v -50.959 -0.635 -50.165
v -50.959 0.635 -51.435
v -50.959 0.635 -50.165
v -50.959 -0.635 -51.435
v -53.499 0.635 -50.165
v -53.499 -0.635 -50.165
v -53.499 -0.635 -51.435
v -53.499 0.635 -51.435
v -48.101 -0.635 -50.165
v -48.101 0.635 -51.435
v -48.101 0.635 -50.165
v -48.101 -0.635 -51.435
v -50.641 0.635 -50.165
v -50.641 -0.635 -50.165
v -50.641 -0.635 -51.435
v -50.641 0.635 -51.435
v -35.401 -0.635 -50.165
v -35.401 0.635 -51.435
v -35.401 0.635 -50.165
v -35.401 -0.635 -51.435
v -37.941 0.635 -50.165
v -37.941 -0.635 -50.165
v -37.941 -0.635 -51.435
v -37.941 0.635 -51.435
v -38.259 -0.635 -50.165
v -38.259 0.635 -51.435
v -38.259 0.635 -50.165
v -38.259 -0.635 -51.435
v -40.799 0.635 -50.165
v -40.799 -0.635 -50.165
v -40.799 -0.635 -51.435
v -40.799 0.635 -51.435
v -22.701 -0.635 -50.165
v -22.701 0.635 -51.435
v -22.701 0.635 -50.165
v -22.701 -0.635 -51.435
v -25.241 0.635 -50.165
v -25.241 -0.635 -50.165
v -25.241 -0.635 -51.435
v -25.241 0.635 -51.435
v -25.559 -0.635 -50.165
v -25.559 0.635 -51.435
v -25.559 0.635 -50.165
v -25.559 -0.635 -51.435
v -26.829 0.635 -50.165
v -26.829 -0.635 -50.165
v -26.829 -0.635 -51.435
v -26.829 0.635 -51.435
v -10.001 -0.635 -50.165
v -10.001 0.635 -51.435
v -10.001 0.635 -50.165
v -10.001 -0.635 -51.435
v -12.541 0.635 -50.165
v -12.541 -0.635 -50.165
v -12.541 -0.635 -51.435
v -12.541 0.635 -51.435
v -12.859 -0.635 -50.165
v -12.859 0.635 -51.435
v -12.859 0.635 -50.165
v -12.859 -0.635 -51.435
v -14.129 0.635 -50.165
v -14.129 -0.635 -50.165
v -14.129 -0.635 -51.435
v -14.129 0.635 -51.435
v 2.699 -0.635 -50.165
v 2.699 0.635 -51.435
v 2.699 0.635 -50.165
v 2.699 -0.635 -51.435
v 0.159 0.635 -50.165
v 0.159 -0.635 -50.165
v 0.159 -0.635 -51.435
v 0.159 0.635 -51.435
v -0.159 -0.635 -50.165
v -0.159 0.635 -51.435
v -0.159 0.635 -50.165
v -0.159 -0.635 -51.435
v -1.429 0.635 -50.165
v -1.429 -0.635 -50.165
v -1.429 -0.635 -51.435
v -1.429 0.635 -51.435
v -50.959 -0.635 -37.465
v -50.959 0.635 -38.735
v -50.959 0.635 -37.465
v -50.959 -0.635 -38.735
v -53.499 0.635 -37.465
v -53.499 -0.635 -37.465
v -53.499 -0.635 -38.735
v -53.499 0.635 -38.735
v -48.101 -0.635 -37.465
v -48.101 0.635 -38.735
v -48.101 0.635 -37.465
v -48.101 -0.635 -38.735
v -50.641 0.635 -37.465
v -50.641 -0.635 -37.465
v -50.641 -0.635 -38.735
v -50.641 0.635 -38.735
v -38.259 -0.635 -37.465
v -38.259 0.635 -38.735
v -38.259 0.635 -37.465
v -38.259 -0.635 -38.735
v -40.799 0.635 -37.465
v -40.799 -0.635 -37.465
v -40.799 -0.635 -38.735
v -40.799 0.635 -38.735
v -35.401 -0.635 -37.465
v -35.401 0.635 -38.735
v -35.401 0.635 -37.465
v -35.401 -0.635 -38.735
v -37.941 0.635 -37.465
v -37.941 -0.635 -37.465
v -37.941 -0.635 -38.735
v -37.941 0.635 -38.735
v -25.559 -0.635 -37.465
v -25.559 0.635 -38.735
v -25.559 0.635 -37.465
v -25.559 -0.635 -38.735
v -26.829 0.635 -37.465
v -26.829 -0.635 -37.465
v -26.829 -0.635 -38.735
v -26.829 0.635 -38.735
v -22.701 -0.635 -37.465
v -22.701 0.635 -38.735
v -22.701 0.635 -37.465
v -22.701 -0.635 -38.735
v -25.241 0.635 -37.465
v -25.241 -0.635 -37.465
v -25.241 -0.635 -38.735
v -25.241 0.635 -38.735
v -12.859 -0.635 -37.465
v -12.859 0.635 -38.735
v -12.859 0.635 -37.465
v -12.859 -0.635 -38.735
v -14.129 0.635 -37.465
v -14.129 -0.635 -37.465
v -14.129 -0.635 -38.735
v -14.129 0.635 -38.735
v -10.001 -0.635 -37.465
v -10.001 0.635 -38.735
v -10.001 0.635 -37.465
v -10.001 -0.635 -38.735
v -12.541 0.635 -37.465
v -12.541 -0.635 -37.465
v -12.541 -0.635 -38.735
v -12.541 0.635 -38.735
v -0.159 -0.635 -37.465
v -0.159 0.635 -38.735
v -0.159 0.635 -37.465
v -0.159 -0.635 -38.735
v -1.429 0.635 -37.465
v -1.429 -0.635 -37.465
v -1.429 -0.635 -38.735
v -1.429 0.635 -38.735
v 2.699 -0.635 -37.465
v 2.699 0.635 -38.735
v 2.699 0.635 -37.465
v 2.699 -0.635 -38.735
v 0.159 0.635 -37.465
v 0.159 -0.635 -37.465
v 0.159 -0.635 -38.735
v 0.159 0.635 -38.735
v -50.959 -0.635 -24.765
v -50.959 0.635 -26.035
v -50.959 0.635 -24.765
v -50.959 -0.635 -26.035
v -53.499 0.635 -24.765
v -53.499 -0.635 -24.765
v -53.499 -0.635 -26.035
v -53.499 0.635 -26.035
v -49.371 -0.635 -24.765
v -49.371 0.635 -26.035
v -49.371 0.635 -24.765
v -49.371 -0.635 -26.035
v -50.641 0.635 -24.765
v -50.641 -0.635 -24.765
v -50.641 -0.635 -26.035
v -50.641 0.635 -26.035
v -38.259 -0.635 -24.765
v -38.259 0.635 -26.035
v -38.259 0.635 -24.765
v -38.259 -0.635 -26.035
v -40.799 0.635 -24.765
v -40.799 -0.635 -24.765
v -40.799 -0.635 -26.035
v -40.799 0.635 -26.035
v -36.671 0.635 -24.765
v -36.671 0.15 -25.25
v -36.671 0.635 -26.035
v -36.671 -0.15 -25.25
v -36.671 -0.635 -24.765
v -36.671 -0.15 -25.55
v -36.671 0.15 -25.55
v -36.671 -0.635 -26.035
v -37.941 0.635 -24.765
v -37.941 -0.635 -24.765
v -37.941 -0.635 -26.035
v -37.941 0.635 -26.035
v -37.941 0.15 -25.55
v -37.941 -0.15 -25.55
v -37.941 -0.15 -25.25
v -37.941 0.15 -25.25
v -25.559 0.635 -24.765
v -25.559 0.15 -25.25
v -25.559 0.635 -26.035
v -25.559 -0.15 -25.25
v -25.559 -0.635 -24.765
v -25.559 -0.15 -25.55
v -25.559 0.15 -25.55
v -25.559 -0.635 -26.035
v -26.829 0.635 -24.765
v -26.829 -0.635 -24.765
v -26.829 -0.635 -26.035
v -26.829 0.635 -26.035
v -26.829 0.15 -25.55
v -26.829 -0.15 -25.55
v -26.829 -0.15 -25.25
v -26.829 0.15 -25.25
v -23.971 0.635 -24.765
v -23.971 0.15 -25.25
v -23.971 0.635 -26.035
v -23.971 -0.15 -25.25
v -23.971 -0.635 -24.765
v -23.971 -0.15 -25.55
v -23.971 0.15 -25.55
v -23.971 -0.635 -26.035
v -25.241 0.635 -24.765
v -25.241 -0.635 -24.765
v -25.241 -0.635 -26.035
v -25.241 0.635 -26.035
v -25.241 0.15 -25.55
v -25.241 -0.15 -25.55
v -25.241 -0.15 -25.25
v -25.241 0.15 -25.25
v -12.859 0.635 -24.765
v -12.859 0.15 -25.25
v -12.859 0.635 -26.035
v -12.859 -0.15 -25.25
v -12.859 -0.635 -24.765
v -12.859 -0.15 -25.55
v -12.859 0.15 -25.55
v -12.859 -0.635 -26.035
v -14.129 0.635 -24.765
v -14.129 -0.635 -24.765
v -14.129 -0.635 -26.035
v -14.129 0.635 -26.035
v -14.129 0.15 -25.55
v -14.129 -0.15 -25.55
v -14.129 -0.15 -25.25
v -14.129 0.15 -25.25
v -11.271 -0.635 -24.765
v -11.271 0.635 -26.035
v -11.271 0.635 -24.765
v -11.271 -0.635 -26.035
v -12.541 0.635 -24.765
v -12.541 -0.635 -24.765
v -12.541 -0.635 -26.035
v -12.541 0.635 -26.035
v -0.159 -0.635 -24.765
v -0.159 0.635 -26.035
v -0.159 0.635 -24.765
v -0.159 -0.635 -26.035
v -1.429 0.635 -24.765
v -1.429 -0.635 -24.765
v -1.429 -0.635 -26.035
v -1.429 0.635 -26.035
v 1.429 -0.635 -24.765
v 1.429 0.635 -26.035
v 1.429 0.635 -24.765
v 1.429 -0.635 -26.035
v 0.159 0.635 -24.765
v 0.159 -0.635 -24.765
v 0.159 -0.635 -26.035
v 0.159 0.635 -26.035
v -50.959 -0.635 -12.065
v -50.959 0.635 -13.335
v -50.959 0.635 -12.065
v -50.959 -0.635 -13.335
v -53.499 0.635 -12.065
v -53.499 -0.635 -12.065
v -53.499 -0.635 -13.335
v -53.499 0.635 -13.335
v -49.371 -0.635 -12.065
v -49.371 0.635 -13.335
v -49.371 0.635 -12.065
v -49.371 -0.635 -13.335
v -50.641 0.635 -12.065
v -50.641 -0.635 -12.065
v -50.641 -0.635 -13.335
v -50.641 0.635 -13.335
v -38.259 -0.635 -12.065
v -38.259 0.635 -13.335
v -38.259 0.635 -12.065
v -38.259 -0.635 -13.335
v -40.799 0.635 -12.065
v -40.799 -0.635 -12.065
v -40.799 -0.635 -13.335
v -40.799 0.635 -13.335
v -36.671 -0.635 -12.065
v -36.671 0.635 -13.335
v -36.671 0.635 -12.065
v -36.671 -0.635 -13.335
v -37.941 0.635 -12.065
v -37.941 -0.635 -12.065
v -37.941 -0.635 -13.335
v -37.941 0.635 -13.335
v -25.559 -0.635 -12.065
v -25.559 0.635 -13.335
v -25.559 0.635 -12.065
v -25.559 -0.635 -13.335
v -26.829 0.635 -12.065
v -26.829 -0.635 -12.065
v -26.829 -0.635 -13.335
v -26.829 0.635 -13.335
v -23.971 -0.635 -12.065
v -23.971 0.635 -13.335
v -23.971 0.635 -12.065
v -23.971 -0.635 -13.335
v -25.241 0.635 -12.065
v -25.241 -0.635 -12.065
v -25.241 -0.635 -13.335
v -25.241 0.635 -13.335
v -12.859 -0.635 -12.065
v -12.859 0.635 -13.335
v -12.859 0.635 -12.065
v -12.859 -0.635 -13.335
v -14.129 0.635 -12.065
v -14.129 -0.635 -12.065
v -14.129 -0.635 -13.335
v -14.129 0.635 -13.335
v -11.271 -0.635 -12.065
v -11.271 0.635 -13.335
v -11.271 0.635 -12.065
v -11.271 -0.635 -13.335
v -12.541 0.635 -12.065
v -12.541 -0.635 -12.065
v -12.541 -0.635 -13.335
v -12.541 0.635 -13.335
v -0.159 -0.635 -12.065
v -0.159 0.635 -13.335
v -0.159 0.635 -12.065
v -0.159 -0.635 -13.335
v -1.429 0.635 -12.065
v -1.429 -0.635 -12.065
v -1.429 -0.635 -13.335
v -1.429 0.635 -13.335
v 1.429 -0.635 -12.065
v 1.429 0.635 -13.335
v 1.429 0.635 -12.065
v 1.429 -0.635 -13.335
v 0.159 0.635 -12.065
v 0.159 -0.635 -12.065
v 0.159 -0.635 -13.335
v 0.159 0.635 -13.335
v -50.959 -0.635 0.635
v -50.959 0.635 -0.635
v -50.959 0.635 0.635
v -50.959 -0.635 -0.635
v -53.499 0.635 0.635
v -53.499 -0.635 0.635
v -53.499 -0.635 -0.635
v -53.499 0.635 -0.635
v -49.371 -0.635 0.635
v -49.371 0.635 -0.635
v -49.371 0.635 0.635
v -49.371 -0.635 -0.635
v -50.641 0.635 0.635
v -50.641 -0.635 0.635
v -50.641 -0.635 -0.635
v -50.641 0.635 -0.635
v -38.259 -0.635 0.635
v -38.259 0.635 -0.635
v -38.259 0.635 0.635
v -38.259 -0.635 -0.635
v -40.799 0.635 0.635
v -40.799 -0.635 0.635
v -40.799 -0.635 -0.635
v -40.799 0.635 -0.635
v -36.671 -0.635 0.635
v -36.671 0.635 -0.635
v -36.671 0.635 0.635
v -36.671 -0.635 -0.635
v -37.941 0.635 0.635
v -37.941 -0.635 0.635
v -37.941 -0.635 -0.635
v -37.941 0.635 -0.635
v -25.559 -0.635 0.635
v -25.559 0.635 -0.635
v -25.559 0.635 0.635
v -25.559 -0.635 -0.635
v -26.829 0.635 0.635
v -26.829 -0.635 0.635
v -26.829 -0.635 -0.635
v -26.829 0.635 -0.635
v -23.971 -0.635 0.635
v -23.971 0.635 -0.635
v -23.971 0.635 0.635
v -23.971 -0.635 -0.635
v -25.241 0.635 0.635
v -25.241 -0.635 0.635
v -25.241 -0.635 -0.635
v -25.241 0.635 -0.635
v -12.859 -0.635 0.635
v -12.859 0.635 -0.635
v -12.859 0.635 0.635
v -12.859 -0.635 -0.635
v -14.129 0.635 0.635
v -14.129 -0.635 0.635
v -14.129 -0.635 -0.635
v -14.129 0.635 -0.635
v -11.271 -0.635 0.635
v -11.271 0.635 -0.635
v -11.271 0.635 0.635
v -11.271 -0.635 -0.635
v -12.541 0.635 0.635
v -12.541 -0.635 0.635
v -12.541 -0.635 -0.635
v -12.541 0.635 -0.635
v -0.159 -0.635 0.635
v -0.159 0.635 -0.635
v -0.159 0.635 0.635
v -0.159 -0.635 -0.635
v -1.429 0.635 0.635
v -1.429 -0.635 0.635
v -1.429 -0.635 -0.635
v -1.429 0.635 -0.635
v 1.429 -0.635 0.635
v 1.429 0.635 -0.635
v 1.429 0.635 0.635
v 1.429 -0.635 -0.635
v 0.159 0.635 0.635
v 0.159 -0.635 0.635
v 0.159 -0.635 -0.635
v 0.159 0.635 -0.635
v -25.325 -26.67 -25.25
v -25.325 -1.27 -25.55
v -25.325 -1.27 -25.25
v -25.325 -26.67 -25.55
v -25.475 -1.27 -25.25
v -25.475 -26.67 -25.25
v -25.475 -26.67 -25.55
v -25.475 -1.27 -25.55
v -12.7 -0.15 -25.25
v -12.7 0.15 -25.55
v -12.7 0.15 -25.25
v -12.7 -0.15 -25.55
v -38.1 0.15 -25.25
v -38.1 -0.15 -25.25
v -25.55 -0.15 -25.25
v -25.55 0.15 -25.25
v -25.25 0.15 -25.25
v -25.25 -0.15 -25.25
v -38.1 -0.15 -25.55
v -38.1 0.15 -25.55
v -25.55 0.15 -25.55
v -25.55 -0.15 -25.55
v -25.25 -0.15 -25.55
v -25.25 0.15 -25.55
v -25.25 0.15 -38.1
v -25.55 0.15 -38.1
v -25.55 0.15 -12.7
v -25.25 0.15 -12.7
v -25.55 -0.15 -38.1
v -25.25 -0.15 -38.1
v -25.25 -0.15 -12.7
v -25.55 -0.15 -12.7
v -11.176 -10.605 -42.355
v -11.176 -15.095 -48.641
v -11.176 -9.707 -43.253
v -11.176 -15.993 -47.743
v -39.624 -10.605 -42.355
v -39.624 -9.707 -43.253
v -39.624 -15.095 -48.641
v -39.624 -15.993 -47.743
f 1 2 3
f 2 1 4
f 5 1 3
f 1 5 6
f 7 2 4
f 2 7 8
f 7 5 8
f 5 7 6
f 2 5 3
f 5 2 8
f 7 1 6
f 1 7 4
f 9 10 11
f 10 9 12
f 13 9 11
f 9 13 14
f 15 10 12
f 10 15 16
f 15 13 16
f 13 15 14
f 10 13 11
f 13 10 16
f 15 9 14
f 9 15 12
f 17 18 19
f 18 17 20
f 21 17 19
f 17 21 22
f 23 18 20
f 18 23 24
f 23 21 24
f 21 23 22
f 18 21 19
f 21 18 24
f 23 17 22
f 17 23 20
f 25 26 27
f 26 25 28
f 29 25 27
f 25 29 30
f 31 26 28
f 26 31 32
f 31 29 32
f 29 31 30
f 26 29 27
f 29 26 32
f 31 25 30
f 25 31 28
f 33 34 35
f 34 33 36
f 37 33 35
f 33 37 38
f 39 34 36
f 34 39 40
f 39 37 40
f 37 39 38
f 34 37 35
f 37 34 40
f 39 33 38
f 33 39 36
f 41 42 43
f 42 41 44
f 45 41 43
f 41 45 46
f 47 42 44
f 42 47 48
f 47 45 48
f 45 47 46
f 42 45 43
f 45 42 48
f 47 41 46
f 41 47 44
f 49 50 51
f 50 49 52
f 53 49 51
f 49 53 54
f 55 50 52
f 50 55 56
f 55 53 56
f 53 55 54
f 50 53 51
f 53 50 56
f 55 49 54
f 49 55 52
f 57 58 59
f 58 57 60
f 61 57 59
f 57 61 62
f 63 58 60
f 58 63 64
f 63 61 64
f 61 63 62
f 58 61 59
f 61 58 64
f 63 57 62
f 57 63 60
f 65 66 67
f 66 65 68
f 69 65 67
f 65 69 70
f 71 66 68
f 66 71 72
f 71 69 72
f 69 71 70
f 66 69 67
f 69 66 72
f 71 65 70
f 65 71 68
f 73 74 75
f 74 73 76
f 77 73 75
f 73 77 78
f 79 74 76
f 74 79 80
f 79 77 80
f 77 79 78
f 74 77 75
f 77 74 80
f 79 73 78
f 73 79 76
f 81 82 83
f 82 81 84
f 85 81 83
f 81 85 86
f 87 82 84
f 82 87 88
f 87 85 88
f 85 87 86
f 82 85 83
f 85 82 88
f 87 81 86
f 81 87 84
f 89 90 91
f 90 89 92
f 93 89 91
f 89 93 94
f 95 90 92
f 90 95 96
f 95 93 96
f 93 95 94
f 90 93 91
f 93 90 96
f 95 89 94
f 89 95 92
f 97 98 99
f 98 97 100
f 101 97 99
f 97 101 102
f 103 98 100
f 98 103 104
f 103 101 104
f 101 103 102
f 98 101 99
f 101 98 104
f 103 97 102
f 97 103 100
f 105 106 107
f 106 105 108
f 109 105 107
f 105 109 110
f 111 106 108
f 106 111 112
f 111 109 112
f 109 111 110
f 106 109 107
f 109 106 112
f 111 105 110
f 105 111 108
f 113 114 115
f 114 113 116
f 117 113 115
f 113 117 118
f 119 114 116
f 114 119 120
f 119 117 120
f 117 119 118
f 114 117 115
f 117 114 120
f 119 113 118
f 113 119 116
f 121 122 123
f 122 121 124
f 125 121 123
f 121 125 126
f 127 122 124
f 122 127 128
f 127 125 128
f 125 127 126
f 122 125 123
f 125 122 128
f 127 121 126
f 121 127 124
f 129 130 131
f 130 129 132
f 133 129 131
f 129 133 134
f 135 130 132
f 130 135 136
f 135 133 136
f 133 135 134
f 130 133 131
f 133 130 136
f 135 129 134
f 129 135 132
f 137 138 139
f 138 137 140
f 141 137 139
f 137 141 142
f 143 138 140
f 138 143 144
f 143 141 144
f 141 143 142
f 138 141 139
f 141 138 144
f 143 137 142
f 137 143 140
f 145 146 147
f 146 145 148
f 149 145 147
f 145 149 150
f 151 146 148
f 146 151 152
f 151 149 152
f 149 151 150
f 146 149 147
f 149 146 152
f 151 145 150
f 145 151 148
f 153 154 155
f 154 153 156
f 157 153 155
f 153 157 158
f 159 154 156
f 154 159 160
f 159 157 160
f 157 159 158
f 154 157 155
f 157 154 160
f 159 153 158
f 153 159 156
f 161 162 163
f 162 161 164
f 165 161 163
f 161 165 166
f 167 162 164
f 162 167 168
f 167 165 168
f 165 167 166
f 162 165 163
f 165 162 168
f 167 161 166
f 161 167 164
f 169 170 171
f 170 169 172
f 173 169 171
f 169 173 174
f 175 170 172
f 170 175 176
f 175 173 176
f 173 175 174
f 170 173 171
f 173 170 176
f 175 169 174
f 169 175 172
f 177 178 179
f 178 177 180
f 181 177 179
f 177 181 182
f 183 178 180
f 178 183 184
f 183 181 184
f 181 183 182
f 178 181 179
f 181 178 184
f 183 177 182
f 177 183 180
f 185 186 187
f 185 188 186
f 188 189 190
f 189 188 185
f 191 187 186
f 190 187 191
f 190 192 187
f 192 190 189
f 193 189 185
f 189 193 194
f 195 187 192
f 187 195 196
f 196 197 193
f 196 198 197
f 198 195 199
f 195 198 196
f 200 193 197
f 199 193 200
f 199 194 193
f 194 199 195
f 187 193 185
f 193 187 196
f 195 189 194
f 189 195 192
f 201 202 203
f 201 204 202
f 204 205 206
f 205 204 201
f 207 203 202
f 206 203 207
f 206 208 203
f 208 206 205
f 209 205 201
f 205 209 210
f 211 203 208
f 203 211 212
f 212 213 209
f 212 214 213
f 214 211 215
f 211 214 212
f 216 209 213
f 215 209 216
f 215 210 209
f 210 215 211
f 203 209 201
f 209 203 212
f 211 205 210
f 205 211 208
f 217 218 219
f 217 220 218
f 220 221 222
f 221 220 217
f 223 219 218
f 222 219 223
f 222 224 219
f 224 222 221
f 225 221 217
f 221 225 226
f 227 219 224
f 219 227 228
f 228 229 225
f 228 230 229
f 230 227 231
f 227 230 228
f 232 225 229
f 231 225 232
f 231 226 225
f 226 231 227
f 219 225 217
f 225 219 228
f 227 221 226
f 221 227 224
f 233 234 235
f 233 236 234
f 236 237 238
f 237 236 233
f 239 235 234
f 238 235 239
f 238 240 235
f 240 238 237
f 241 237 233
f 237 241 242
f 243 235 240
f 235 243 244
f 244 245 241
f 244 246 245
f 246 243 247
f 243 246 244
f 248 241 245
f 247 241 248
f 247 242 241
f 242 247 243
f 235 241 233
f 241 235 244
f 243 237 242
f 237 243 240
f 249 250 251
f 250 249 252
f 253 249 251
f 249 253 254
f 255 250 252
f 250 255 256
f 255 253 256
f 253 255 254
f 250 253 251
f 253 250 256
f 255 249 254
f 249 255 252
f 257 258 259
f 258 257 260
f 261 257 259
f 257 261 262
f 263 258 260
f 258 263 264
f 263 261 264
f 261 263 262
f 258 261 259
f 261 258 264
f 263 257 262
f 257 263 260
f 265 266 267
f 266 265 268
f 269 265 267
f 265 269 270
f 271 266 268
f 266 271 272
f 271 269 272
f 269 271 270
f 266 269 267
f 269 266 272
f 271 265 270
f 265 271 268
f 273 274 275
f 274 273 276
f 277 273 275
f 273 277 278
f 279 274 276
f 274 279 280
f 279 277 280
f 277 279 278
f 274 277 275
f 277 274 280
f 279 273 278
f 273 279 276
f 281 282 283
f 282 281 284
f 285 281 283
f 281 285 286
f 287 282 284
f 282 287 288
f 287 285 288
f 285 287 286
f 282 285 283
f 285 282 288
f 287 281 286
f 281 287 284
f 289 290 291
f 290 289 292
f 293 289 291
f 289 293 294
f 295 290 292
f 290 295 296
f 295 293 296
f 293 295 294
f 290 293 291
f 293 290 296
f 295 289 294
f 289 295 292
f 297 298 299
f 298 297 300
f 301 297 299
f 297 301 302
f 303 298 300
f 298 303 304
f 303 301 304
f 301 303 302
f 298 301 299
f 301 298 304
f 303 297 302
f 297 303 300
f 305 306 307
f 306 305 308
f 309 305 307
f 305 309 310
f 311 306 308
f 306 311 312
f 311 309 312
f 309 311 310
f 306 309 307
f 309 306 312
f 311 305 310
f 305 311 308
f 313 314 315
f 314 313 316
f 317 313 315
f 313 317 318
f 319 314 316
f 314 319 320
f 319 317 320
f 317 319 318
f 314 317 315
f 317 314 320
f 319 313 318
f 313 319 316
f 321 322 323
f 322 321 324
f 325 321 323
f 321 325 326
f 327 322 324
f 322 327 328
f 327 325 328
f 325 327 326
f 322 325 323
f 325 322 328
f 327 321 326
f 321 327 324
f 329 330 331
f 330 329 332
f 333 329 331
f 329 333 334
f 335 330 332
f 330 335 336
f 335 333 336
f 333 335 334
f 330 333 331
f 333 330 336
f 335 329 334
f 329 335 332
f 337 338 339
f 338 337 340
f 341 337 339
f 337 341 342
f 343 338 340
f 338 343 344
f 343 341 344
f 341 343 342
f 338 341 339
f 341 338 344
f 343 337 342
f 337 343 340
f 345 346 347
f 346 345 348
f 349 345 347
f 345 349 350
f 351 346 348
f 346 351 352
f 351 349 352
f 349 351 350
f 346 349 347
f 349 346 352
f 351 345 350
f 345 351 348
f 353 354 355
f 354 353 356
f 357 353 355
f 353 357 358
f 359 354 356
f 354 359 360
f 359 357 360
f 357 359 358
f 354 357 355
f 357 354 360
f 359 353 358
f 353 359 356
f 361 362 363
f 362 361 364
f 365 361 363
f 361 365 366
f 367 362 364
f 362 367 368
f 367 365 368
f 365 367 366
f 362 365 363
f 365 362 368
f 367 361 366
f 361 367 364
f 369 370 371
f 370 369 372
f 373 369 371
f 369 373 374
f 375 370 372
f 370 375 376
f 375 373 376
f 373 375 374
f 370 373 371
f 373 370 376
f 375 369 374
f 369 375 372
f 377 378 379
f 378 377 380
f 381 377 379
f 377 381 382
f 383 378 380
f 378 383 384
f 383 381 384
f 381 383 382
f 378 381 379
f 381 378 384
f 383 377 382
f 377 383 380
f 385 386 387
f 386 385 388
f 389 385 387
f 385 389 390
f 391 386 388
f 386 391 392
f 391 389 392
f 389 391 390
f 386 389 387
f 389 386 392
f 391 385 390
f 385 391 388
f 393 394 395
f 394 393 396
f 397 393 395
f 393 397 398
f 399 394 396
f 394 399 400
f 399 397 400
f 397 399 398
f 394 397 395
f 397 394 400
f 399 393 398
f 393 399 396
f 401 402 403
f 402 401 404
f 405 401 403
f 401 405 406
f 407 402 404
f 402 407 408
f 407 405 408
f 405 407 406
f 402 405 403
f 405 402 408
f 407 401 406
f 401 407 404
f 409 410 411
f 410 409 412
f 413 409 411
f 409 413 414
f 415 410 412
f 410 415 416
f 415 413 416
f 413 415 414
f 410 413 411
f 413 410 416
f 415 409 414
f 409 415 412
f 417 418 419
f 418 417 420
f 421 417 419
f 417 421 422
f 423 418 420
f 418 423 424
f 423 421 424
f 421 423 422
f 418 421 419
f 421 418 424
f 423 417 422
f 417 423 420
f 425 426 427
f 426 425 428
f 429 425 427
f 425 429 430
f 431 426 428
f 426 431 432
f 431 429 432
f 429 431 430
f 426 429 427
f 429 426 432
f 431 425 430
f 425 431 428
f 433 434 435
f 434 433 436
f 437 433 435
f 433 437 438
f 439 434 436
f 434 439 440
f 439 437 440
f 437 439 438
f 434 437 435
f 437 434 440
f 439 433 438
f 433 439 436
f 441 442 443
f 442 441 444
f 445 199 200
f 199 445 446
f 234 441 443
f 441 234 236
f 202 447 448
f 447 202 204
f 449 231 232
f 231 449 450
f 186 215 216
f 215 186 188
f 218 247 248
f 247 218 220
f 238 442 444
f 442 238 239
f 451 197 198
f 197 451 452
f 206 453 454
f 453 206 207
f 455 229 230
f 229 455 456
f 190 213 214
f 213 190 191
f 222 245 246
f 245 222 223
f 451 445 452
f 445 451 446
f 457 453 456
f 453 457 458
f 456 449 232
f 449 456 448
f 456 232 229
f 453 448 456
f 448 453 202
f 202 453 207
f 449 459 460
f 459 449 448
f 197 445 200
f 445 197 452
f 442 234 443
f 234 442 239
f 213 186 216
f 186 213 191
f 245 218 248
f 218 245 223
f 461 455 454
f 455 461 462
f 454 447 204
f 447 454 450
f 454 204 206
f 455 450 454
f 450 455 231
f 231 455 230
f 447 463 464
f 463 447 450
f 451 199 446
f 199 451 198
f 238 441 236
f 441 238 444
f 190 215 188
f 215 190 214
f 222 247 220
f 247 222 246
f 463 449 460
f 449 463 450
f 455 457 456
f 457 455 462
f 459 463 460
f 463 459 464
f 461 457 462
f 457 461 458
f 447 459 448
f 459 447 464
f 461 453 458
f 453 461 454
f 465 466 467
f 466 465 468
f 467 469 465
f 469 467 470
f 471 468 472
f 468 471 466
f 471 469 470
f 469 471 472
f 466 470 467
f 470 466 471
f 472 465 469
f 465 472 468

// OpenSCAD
include <../mo/mo.scad>

module moGrid( p = [ 0, 0 ], xs = 3, ys = 3, s = 0.5 * in, info = false ) {
  if ( info == true ) {
    moMoveOriginTo( moGridPosition( p, s = s ) ) {
      for ( yi = [ -ys + 1 : ys - 1] )
        for ( xi = [ -xs + 1 : xs -1 ] )
          translate( [xi * s, 0, yi * s])
            moPosition2( [ xi, yi ] );
    }
    moPartOrigin();
  }
  if ( $name )
    moPartLabel( parent_module( 1 ) );
}

function moGridPosition( p = [ 0, 0 ],  s = 0.5 * in ) = [
  [
    (p[0]) * s,
    0,
    (p[1]) * s
  ],
  [ 0, 0, 1 ],
  0
];

moMoveOriginTo( moGridPosition( [ 2, 2, ] ) )
  moGrid( [0, 0], info = true, $name = true );
